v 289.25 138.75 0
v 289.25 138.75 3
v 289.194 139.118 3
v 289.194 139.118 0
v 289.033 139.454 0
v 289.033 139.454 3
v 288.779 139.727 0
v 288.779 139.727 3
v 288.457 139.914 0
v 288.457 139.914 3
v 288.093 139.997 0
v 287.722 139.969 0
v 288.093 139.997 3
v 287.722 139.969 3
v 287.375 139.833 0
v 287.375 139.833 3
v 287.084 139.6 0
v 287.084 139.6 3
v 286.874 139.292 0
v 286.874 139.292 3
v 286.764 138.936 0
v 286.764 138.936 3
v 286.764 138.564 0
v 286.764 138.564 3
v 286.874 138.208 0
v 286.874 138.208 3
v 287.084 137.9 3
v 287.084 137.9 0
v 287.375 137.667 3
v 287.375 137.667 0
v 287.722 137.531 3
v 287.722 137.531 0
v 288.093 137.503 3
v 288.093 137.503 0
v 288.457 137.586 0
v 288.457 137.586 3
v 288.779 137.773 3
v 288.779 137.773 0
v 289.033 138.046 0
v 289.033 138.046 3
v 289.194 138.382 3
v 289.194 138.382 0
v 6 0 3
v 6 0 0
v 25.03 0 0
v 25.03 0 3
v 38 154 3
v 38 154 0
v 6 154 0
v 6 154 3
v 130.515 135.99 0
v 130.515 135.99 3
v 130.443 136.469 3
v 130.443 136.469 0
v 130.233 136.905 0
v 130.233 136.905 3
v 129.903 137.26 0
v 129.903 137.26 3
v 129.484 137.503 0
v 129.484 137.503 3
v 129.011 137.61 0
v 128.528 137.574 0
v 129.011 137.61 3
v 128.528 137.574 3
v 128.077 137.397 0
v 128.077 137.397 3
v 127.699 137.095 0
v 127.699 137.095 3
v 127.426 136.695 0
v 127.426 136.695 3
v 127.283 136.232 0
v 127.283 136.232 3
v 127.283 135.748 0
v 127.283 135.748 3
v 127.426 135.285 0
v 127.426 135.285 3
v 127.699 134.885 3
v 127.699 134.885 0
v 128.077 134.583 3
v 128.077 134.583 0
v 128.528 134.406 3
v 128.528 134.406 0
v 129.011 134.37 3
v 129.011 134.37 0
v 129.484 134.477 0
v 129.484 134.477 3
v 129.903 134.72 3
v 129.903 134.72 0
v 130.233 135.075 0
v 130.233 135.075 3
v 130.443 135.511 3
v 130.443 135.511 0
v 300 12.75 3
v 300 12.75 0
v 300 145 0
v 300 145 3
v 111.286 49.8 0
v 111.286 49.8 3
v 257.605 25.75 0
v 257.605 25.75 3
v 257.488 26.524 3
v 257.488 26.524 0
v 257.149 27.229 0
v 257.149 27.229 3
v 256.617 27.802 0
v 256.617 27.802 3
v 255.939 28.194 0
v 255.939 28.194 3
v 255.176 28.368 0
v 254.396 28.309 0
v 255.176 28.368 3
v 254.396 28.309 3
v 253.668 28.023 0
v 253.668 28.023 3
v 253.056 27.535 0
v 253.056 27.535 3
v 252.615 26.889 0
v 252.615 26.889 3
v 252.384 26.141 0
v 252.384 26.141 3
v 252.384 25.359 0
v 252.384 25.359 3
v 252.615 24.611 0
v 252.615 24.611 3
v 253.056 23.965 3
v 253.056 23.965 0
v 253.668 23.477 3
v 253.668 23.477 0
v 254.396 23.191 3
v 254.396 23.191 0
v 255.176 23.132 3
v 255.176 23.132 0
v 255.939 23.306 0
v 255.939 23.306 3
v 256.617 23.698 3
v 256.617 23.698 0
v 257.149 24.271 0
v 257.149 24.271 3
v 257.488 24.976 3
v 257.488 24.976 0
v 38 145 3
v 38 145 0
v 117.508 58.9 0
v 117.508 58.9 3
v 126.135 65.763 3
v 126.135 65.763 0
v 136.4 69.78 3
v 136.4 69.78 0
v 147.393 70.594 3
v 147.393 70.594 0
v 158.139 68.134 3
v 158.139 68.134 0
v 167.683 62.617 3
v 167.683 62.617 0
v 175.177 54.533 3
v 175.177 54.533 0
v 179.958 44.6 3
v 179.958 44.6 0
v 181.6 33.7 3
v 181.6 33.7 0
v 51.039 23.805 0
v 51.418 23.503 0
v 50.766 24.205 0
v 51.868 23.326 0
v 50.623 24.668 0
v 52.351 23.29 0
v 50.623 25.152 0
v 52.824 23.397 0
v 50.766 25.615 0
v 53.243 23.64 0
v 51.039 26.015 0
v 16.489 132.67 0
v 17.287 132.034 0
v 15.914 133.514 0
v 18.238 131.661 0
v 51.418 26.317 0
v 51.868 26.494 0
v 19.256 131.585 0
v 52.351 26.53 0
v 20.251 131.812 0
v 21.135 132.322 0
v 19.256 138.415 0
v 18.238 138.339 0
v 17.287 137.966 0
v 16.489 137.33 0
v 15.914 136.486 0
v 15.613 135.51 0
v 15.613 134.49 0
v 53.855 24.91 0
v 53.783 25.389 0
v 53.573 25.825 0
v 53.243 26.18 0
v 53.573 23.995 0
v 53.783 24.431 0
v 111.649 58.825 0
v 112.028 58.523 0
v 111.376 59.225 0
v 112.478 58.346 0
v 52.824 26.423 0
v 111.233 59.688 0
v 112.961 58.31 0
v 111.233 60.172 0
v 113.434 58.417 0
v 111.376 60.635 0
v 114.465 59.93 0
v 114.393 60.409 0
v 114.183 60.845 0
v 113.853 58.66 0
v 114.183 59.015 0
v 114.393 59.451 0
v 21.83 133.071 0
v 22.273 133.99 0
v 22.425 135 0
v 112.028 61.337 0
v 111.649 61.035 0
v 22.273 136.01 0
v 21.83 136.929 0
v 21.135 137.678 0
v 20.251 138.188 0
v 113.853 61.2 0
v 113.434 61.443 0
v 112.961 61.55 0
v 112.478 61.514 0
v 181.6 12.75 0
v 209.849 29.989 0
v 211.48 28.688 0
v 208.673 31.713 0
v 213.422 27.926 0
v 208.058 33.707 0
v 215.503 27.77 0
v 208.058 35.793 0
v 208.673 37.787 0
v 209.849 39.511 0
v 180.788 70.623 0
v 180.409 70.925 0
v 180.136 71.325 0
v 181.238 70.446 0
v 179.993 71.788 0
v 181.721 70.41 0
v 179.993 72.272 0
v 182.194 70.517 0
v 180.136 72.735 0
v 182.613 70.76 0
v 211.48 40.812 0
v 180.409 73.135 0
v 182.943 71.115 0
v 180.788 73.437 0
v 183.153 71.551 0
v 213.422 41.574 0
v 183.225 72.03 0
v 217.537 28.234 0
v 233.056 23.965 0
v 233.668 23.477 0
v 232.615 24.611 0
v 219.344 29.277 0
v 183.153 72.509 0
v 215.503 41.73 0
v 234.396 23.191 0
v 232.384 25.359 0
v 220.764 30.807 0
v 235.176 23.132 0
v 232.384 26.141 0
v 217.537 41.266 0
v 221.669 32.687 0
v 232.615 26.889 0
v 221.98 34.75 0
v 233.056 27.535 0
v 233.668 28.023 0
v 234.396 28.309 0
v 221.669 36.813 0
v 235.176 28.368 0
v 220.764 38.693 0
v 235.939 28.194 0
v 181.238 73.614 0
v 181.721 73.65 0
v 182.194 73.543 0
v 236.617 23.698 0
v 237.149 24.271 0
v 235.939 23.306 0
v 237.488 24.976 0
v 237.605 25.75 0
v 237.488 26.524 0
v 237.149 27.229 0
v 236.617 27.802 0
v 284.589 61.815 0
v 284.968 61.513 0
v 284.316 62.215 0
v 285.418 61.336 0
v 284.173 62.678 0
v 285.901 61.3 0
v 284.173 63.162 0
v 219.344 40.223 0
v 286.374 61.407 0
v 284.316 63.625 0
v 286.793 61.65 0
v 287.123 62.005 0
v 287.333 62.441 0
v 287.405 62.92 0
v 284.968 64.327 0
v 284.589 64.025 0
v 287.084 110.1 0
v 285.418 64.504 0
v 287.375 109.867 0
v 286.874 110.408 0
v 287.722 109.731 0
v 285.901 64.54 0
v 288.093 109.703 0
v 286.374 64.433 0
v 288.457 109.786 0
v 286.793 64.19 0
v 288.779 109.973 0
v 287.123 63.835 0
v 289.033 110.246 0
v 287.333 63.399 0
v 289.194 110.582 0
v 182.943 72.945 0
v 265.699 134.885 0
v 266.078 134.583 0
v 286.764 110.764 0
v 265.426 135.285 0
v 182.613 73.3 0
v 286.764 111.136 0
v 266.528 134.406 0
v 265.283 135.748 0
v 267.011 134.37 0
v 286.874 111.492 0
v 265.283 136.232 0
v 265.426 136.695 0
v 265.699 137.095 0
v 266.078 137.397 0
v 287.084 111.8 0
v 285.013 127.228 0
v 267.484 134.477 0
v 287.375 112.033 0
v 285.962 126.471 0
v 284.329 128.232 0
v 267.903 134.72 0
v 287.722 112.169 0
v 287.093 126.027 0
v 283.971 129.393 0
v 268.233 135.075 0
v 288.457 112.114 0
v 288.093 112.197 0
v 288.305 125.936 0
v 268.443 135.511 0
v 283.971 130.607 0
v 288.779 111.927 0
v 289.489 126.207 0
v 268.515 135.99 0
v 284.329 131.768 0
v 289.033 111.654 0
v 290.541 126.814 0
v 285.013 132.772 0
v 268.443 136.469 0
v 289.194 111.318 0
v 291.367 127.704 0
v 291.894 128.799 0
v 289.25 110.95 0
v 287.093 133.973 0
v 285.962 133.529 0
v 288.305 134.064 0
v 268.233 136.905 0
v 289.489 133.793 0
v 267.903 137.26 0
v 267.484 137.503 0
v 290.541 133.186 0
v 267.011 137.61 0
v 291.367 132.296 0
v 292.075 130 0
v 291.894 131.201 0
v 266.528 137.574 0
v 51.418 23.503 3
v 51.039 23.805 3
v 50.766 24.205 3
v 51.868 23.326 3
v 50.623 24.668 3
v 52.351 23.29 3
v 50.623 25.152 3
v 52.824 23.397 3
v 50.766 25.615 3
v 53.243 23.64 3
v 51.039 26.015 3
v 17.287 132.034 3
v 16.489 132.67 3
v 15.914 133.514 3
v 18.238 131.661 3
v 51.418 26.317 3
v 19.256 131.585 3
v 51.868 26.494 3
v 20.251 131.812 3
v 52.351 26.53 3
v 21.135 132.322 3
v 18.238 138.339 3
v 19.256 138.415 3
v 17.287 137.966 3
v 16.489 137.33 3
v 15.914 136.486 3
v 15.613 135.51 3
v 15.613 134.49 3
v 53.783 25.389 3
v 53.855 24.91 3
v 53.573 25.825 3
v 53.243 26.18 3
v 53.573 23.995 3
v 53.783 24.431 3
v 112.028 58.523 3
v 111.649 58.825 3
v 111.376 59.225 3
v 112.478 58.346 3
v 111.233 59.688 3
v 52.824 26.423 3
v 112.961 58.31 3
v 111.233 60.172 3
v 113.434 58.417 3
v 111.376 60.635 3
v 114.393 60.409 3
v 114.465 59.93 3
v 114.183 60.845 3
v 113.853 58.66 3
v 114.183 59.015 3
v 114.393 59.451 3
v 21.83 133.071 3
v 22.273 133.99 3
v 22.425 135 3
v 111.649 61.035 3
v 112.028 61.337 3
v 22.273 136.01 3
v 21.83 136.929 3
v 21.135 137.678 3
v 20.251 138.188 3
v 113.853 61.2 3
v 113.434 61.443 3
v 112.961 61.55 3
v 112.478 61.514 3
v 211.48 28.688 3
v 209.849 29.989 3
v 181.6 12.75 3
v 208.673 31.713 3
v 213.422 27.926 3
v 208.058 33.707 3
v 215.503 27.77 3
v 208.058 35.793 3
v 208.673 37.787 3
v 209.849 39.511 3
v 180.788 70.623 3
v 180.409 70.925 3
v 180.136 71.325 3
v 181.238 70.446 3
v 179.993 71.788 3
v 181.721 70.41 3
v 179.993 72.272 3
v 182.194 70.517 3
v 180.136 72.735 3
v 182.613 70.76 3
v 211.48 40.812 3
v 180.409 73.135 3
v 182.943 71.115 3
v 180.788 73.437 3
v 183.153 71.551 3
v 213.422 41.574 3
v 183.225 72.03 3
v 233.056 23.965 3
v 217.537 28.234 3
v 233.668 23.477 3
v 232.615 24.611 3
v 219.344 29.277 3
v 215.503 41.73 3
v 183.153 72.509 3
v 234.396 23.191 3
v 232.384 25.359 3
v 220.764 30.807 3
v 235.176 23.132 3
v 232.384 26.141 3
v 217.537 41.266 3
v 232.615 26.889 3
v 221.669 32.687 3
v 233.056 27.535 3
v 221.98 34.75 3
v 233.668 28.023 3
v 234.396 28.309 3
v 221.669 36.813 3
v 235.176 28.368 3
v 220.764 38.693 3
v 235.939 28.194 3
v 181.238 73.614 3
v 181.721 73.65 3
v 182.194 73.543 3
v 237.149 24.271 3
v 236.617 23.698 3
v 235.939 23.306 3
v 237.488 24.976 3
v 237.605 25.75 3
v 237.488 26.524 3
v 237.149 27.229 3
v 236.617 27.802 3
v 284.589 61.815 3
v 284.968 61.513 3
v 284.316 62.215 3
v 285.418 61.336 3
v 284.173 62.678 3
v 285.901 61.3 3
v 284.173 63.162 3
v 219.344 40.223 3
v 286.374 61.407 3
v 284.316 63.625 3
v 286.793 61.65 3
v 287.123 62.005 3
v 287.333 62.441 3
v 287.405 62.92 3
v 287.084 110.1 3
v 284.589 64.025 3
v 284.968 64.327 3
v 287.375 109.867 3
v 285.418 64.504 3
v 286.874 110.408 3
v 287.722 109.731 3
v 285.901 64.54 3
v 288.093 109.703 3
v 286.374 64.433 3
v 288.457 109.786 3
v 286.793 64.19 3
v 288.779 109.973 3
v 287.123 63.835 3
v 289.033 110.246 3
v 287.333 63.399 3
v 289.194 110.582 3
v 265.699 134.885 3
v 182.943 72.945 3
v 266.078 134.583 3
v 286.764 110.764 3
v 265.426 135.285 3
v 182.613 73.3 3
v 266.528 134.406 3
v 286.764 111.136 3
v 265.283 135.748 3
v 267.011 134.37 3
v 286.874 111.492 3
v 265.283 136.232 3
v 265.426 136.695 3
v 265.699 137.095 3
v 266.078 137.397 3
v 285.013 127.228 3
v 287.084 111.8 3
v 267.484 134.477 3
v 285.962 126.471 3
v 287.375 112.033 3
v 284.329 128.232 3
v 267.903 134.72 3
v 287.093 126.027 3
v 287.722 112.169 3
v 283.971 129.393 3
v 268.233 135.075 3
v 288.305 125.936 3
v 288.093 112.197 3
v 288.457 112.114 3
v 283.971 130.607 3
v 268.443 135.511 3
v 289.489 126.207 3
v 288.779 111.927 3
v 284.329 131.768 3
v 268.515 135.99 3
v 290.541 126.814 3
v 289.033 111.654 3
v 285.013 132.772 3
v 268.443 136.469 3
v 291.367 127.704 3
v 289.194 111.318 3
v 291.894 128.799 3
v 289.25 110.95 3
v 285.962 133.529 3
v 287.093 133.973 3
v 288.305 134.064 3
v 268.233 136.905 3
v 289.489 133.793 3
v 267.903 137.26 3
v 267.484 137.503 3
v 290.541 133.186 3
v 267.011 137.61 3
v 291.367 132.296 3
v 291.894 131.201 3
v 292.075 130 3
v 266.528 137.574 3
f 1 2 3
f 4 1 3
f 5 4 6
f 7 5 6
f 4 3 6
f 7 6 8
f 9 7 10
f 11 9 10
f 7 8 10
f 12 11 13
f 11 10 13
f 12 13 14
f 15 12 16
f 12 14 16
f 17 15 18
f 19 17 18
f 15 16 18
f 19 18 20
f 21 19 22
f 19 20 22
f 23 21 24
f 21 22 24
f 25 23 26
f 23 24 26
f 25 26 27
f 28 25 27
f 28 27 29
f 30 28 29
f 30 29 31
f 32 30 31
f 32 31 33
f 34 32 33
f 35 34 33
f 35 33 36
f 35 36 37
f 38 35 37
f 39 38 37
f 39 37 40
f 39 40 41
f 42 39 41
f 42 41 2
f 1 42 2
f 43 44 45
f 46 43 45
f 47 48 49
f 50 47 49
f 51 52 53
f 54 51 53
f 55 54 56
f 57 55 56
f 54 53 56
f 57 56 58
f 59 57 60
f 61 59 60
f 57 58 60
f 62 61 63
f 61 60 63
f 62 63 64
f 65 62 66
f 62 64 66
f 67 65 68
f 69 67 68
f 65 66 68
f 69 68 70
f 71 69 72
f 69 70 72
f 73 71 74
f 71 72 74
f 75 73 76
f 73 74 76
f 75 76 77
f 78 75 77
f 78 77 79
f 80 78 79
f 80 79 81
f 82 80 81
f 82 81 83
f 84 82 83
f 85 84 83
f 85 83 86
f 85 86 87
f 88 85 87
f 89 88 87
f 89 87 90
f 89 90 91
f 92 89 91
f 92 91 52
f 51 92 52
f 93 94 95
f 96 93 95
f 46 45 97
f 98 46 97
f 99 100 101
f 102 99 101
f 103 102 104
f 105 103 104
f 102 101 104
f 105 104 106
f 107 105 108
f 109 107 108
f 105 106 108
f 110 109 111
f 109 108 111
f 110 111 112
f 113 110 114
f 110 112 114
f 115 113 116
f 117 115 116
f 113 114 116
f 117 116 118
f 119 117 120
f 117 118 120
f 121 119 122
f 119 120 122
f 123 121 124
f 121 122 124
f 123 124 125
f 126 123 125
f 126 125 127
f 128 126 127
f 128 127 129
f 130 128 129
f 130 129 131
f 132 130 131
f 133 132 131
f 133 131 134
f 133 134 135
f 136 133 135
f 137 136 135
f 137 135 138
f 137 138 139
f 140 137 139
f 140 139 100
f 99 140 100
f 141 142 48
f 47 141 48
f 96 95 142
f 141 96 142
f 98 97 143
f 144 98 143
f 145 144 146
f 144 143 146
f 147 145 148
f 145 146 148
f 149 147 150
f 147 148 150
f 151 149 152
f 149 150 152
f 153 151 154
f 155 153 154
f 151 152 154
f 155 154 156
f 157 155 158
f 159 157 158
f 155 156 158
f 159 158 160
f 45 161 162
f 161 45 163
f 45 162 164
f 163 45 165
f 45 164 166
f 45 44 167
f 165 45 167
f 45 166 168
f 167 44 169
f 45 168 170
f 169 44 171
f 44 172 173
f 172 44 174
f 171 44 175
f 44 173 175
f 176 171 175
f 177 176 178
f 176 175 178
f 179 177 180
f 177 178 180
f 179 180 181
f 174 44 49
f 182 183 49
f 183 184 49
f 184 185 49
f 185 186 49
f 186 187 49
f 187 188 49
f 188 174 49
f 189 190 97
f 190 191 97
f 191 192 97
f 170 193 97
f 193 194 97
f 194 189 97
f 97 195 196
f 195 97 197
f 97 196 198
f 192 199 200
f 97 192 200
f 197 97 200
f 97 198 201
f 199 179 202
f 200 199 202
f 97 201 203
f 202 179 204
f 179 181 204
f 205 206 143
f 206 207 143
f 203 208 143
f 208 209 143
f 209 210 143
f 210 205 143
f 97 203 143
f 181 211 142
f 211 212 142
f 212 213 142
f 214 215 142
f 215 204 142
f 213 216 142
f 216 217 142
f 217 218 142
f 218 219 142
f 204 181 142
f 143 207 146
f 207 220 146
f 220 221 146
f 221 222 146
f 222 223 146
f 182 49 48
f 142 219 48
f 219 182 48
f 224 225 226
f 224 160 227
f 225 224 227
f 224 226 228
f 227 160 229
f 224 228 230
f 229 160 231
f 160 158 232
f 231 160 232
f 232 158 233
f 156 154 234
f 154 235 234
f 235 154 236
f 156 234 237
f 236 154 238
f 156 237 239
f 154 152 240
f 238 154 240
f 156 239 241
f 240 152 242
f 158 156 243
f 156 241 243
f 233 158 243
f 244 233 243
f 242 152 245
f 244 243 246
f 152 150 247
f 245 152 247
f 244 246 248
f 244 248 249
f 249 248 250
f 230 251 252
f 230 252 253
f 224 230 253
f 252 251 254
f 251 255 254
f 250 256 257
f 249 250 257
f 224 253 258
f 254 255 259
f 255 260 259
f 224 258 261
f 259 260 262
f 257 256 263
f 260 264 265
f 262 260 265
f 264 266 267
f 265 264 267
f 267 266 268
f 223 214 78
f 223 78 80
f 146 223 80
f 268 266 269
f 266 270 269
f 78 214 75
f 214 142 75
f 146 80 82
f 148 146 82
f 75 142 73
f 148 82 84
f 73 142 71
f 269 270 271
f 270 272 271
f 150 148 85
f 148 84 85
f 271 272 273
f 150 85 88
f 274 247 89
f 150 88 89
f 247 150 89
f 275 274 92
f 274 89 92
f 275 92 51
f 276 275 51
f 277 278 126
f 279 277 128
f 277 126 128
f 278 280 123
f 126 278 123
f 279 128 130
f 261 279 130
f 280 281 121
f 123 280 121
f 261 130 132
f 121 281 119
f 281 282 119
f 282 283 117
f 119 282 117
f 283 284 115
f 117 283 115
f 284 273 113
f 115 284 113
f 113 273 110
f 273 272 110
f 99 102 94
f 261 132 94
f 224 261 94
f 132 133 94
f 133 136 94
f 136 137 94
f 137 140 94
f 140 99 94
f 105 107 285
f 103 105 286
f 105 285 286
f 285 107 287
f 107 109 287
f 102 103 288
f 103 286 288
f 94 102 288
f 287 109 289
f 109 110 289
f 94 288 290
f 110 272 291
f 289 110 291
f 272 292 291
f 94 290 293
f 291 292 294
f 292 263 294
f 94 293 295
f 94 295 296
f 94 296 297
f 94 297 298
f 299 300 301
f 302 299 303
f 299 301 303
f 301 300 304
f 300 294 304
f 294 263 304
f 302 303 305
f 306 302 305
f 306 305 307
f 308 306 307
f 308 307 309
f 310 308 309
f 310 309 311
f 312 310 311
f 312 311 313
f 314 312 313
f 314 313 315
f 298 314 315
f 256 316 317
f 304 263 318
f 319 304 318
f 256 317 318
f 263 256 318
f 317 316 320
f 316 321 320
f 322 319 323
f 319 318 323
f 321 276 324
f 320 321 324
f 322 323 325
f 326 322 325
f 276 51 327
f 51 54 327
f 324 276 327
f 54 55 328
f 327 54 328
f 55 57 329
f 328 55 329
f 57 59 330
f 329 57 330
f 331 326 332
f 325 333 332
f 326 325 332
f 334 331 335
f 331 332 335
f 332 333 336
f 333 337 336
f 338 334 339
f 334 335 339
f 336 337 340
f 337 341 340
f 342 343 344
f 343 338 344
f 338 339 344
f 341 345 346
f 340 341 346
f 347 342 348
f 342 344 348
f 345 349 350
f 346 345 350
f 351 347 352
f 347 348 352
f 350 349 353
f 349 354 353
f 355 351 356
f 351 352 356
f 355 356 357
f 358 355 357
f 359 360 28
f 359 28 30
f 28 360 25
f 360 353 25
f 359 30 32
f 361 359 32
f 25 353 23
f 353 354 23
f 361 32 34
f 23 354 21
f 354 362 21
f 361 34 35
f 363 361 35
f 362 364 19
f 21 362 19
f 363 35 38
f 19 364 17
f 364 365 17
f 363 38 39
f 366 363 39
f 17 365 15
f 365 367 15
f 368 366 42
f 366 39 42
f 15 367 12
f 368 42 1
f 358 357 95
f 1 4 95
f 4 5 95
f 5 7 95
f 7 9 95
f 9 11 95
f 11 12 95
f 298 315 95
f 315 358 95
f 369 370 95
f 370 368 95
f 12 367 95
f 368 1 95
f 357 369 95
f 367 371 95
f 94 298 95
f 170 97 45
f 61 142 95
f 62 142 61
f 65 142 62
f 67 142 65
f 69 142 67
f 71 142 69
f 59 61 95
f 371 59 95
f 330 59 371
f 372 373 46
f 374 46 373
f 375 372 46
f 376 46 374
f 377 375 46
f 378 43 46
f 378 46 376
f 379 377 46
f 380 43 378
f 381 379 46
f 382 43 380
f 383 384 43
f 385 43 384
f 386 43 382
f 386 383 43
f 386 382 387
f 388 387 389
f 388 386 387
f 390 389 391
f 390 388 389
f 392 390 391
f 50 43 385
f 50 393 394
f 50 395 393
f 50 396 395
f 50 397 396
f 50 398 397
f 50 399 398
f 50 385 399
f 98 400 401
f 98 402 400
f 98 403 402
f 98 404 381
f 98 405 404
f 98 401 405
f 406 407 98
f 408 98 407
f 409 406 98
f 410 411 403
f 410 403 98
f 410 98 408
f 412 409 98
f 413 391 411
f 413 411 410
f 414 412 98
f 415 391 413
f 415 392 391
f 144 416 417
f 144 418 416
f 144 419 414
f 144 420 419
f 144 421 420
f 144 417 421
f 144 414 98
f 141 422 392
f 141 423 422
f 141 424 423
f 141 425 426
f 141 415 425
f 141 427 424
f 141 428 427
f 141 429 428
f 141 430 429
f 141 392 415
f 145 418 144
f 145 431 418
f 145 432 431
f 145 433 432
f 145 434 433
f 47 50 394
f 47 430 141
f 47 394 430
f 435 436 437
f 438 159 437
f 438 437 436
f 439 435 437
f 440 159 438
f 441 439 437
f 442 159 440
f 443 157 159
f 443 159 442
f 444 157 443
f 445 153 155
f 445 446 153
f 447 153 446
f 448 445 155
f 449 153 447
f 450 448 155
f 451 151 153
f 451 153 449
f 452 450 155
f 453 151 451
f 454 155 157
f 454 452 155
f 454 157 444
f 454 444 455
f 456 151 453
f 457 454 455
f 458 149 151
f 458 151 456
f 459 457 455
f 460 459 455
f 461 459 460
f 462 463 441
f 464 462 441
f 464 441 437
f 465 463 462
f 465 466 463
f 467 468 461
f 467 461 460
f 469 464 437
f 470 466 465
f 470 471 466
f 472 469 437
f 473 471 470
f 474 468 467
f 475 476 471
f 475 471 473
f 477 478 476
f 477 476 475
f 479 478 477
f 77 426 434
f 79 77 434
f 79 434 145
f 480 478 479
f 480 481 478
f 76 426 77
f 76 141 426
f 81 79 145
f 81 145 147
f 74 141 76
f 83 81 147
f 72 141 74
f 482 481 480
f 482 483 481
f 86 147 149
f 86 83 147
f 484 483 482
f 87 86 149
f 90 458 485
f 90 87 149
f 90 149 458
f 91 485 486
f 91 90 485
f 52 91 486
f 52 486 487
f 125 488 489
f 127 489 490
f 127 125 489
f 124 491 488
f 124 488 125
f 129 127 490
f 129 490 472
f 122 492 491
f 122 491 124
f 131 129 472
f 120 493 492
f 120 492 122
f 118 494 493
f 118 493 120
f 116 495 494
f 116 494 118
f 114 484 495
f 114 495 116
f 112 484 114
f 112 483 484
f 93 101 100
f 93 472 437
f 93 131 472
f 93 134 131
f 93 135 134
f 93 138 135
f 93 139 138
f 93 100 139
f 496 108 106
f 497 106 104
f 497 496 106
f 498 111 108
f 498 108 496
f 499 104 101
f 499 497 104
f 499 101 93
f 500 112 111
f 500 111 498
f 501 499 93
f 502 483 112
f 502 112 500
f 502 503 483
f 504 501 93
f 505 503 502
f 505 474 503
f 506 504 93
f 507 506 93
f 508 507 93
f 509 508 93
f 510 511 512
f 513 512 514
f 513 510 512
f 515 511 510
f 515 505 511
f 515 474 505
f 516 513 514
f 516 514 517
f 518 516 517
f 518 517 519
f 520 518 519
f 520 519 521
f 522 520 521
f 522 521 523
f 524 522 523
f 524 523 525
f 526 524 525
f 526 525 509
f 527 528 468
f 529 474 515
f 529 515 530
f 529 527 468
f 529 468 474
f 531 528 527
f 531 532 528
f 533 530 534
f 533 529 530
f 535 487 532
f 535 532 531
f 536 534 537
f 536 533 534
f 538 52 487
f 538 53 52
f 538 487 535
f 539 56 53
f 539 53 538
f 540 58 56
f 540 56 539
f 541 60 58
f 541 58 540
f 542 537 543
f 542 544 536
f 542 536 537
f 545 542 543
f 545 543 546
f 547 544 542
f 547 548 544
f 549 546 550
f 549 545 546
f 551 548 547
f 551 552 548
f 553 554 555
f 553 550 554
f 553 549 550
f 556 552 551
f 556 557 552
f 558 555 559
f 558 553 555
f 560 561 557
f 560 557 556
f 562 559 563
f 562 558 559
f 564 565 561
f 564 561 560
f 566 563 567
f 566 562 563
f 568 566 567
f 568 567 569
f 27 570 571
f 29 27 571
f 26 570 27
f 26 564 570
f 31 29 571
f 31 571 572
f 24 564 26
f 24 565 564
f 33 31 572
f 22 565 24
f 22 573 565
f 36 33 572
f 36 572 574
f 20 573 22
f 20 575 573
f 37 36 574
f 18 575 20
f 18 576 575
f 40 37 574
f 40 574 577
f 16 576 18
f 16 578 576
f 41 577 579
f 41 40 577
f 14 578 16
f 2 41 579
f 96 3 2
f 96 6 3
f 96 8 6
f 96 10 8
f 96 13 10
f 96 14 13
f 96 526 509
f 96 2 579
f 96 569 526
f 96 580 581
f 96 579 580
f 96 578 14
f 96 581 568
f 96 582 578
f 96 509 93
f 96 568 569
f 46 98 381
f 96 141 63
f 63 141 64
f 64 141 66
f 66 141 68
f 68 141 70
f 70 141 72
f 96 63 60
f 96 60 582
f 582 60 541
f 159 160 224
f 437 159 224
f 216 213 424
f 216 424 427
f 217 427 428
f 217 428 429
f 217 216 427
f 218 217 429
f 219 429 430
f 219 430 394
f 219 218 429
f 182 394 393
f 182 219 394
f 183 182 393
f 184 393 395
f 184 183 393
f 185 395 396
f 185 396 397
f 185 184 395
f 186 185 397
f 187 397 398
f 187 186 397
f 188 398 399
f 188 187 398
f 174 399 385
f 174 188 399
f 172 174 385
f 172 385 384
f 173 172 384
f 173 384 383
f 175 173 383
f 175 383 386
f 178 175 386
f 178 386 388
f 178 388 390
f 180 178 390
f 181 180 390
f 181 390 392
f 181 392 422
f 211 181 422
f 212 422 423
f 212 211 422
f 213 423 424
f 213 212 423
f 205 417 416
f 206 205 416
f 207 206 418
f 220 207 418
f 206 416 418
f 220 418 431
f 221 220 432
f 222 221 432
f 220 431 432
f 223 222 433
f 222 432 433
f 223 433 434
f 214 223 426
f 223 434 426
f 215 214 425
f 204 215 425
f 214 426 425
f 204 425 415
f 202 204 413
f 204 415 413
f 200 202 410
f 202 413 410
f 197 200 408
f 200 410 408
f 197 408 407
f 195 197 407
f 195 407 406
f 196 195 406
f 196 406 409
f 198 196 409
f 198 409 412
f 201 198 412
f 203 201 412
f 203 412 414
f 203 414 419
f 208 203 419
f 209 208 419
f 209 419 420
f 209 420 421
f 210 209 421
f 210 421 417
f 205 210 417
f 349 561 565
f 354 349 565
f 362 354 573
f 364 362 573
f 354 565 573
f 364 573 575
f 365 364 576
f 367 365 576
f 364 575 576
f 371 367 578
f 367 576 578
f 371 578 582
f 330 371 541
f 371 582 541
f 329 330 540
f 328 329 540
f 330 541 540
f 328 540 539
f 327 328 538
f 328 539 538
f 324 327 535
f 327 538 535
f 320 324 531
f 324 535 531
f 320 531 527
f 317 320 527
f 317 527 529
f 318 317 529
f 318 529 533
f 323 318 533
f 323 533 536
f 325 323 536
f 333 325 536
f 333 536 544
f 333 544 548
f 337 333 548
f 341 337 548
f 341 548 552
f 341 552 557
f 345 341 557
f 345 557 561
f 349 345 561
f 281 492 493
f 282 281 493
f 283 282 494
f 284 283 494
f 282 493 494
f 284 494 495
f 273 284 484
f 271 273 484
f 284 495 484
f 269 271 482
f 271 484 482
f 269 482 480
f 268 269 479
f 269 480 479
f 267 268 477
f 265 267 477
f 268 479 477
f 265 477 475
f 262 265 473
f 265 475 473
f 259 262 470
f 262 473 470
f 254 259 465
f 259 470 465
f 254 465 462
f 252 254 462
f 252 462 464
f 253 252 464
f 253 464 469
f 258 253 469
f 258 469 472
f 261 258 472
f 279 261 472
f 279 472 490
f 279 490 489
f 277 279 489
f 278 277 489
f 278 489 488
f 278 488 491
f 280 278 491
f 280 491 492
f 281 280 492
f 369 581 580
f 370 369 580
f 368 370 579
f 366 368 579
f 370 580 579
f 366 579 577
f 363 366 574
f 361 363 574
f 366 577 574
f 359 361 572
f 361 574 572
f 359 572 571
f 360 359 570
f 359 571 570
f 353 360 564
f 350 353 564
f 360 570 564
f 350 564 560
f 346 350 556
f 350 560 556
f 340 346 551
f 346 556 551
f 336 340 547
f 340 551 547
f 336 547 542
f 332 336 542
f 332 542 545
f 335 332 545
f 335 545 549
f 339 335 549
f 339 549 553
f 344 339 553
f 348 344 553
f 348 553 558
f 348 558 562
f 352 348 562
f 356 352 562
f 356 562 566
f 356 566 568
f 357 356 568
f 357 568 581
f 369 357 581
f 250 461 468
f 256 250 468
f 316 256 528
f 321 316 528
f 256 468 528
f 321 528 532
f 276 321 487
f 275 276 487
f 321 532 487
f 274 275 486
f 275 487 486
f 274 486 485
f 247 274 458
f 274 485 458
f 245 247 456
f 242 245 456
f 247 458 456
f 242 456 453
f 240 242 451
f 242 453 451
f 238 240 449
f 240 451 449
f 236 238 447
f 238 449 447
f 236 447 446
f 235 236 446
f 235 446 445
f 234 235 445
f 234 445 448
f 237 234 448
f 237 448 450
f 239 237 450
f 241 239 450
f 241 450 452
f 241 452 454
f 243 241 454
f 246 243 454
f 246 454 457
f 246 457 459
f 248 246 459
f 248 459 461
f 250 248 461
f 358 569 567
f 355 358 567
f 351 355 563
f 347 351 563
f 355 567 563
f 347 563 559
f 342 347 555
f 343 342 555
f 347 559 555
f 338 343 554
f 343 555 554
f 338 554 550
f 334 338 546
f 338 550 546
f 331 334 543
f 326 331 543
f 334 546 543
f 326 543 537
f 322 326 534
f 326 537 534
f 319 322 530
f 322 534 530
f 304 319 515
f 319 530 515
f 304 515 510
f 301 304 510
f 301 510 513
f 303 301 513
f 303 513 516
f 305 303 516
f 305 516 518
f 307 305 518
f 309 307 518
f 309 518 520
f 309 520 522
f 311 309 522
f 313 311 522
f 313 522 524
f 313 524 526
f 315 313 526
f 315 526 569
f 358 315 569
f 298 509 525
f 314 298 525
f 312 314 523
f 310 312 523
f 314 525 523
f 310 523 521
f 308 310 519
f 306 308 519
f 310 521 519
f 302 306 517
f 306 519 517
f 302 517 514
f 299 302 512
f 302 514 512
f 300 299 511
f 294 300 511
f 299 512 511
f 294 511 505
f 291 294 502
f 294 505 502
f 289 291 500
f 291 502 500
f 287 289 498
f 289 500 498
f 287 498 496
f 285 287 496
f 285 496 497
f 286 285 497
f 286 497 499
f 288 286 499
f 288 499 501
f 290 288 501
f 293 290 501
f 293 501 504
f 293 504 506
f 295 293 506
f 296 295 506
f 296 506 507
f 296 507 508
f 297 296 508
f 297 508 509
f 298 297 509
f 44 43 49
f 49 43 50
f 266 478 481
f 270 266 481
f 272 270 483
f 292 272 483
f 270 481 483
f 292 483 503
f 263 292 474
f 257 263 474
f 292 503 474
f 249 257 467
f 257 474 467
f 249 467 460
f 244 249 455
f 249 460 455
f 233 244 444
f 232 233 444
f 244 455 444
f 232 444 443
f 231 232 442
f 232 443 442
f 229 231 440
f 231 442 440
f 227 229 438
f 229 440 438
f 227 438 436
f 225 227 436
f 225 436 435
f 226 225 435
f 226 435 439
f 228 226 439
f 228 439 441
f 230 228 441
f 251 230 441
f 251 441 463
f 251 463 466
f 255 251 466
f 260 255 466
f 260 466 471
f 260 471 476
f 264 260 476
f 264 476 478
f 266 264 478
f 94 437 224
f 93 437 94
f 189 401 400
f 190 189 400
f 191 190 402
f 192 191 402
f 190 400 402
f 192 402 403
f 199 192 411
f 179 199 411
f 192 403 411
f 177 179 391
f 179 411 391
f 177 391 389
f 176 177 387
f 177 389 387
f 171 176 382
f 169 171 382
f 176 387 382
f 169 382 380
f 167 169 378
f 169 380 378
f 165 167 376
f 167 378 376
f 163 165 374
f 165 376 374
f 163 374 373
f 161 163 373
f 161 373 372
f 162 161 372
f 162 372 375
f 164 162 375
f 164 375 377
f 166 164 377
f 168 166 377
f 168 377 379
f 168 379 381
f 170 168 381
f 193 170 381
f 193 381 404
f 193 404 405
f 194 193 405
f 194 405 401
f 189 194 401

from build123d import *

# Parameters (mm, degrees)
SKETCH2_R           = 3.425
BOSS_EXTRUDE2_DEPTH = 3
SKETCH3_W           = 118.4
SKETCH3_H           = 12.75
CUT_EXTRUDE1_DEPTH  = 338.231374578
SKETCH5_R           = 2.625
SKETCH5_R_2         = 4.075
SKETCH5_R_3         = 1.25
SKETCH5_R_4         = 1.625
SKETCH5_R_5         = 7
SKETCH5_W           = 6
SKETCH5_H           = 154
CUT_EXTRUDE2_DEPTH  = 338.231374578


with BuildPart() as part:
    # Sketch2 → Boss-Extrude2 (new body)
    with BuildSketch(Plane.XY):
        with BuildLine():
            Line((25.03035901, 0), (111.286489227, 49.8))
            ThreePointArc((111.286489227, 49.8), (152.858332199, 69.766604349), (181.6, 33.7))
            Line((181.6, 33.7), (181.6, 0))
            Line((181.6, 0), (300, 0))
            Line((300, 0), (300, 145))
            Line((300, 145), (38, 145))
            Line((38, 145), (38, 154))
            Line((38, 154), (19, 154))
            Line((19, 154), (0, 154))
            Line((0, 154), (0, 0))
            Line((0, 0), (25.03035901, 0))
        make_face()
        with Locations((19, 135)):
            Circle(SKETCH2_R, mode=Mode.SUBTRACT)
    extrude(amount=BOSS_EXTRUDE2_DEPTH)

    # Sketch3 → Cut-Extrude1 (cut, through all)
    with BuildSketch(Plane.XY.offset(3)):
        with Locations((240.8, 6.375)):
            Rectangle(SKETCH3_W, SKETCH3_H)
    extrude(amount=-CUT_EXTRUDE1_DEPTH, mode=Mode.SUBTRACT)

    # Sketch5 → Cut-Extrude2 (cut, through all)
    with BuildSketch(Plane.XY.offset(3)):
        with Locations((254.98, 25.75)):
            Circle(SKETCH5_R)
        with Locations((234.98, 25.75)):
            Circle(SKETCH5_R)
        with Locations((288, 130)):
            Circle(SKETCH5_R_2)
        with Locations((288, 138.75)):
            Circle(SKETCH5_R_3)
        with Locations((288, 110.95)):
            Circle(SKETCH5_R_3)
        with Locations((181.6, 72.03)):
            Circle(SKETCH5_R_4)
        with Locations((285.78, 62.92)):
            Circle(SKETCH5_R_4)
        with Locations((52.23, 24.91)):
            Circle(SKETCH5_R_4)
        with Locations((112.84, 59.93)):
            Circle(SKETCH5_R_4)
        with Locations((266.89, 135.99)):
            Circle(SKETCH5_R_4)
        with Locations((128.89, 135.99)):
            Circle(SKETCH5_R_4)
        with Locations((214.98, 34.75)):
            Circle(SKETCH5_R_5)
        with Locations((3, 77)):
            Rectangle(SKETCH5_W, SKETCH5_H)
    extrude(amount=-CUT_EXTRUDE2_DEPTH, mode=Mode.SUBTRACT)


solid = part.part
